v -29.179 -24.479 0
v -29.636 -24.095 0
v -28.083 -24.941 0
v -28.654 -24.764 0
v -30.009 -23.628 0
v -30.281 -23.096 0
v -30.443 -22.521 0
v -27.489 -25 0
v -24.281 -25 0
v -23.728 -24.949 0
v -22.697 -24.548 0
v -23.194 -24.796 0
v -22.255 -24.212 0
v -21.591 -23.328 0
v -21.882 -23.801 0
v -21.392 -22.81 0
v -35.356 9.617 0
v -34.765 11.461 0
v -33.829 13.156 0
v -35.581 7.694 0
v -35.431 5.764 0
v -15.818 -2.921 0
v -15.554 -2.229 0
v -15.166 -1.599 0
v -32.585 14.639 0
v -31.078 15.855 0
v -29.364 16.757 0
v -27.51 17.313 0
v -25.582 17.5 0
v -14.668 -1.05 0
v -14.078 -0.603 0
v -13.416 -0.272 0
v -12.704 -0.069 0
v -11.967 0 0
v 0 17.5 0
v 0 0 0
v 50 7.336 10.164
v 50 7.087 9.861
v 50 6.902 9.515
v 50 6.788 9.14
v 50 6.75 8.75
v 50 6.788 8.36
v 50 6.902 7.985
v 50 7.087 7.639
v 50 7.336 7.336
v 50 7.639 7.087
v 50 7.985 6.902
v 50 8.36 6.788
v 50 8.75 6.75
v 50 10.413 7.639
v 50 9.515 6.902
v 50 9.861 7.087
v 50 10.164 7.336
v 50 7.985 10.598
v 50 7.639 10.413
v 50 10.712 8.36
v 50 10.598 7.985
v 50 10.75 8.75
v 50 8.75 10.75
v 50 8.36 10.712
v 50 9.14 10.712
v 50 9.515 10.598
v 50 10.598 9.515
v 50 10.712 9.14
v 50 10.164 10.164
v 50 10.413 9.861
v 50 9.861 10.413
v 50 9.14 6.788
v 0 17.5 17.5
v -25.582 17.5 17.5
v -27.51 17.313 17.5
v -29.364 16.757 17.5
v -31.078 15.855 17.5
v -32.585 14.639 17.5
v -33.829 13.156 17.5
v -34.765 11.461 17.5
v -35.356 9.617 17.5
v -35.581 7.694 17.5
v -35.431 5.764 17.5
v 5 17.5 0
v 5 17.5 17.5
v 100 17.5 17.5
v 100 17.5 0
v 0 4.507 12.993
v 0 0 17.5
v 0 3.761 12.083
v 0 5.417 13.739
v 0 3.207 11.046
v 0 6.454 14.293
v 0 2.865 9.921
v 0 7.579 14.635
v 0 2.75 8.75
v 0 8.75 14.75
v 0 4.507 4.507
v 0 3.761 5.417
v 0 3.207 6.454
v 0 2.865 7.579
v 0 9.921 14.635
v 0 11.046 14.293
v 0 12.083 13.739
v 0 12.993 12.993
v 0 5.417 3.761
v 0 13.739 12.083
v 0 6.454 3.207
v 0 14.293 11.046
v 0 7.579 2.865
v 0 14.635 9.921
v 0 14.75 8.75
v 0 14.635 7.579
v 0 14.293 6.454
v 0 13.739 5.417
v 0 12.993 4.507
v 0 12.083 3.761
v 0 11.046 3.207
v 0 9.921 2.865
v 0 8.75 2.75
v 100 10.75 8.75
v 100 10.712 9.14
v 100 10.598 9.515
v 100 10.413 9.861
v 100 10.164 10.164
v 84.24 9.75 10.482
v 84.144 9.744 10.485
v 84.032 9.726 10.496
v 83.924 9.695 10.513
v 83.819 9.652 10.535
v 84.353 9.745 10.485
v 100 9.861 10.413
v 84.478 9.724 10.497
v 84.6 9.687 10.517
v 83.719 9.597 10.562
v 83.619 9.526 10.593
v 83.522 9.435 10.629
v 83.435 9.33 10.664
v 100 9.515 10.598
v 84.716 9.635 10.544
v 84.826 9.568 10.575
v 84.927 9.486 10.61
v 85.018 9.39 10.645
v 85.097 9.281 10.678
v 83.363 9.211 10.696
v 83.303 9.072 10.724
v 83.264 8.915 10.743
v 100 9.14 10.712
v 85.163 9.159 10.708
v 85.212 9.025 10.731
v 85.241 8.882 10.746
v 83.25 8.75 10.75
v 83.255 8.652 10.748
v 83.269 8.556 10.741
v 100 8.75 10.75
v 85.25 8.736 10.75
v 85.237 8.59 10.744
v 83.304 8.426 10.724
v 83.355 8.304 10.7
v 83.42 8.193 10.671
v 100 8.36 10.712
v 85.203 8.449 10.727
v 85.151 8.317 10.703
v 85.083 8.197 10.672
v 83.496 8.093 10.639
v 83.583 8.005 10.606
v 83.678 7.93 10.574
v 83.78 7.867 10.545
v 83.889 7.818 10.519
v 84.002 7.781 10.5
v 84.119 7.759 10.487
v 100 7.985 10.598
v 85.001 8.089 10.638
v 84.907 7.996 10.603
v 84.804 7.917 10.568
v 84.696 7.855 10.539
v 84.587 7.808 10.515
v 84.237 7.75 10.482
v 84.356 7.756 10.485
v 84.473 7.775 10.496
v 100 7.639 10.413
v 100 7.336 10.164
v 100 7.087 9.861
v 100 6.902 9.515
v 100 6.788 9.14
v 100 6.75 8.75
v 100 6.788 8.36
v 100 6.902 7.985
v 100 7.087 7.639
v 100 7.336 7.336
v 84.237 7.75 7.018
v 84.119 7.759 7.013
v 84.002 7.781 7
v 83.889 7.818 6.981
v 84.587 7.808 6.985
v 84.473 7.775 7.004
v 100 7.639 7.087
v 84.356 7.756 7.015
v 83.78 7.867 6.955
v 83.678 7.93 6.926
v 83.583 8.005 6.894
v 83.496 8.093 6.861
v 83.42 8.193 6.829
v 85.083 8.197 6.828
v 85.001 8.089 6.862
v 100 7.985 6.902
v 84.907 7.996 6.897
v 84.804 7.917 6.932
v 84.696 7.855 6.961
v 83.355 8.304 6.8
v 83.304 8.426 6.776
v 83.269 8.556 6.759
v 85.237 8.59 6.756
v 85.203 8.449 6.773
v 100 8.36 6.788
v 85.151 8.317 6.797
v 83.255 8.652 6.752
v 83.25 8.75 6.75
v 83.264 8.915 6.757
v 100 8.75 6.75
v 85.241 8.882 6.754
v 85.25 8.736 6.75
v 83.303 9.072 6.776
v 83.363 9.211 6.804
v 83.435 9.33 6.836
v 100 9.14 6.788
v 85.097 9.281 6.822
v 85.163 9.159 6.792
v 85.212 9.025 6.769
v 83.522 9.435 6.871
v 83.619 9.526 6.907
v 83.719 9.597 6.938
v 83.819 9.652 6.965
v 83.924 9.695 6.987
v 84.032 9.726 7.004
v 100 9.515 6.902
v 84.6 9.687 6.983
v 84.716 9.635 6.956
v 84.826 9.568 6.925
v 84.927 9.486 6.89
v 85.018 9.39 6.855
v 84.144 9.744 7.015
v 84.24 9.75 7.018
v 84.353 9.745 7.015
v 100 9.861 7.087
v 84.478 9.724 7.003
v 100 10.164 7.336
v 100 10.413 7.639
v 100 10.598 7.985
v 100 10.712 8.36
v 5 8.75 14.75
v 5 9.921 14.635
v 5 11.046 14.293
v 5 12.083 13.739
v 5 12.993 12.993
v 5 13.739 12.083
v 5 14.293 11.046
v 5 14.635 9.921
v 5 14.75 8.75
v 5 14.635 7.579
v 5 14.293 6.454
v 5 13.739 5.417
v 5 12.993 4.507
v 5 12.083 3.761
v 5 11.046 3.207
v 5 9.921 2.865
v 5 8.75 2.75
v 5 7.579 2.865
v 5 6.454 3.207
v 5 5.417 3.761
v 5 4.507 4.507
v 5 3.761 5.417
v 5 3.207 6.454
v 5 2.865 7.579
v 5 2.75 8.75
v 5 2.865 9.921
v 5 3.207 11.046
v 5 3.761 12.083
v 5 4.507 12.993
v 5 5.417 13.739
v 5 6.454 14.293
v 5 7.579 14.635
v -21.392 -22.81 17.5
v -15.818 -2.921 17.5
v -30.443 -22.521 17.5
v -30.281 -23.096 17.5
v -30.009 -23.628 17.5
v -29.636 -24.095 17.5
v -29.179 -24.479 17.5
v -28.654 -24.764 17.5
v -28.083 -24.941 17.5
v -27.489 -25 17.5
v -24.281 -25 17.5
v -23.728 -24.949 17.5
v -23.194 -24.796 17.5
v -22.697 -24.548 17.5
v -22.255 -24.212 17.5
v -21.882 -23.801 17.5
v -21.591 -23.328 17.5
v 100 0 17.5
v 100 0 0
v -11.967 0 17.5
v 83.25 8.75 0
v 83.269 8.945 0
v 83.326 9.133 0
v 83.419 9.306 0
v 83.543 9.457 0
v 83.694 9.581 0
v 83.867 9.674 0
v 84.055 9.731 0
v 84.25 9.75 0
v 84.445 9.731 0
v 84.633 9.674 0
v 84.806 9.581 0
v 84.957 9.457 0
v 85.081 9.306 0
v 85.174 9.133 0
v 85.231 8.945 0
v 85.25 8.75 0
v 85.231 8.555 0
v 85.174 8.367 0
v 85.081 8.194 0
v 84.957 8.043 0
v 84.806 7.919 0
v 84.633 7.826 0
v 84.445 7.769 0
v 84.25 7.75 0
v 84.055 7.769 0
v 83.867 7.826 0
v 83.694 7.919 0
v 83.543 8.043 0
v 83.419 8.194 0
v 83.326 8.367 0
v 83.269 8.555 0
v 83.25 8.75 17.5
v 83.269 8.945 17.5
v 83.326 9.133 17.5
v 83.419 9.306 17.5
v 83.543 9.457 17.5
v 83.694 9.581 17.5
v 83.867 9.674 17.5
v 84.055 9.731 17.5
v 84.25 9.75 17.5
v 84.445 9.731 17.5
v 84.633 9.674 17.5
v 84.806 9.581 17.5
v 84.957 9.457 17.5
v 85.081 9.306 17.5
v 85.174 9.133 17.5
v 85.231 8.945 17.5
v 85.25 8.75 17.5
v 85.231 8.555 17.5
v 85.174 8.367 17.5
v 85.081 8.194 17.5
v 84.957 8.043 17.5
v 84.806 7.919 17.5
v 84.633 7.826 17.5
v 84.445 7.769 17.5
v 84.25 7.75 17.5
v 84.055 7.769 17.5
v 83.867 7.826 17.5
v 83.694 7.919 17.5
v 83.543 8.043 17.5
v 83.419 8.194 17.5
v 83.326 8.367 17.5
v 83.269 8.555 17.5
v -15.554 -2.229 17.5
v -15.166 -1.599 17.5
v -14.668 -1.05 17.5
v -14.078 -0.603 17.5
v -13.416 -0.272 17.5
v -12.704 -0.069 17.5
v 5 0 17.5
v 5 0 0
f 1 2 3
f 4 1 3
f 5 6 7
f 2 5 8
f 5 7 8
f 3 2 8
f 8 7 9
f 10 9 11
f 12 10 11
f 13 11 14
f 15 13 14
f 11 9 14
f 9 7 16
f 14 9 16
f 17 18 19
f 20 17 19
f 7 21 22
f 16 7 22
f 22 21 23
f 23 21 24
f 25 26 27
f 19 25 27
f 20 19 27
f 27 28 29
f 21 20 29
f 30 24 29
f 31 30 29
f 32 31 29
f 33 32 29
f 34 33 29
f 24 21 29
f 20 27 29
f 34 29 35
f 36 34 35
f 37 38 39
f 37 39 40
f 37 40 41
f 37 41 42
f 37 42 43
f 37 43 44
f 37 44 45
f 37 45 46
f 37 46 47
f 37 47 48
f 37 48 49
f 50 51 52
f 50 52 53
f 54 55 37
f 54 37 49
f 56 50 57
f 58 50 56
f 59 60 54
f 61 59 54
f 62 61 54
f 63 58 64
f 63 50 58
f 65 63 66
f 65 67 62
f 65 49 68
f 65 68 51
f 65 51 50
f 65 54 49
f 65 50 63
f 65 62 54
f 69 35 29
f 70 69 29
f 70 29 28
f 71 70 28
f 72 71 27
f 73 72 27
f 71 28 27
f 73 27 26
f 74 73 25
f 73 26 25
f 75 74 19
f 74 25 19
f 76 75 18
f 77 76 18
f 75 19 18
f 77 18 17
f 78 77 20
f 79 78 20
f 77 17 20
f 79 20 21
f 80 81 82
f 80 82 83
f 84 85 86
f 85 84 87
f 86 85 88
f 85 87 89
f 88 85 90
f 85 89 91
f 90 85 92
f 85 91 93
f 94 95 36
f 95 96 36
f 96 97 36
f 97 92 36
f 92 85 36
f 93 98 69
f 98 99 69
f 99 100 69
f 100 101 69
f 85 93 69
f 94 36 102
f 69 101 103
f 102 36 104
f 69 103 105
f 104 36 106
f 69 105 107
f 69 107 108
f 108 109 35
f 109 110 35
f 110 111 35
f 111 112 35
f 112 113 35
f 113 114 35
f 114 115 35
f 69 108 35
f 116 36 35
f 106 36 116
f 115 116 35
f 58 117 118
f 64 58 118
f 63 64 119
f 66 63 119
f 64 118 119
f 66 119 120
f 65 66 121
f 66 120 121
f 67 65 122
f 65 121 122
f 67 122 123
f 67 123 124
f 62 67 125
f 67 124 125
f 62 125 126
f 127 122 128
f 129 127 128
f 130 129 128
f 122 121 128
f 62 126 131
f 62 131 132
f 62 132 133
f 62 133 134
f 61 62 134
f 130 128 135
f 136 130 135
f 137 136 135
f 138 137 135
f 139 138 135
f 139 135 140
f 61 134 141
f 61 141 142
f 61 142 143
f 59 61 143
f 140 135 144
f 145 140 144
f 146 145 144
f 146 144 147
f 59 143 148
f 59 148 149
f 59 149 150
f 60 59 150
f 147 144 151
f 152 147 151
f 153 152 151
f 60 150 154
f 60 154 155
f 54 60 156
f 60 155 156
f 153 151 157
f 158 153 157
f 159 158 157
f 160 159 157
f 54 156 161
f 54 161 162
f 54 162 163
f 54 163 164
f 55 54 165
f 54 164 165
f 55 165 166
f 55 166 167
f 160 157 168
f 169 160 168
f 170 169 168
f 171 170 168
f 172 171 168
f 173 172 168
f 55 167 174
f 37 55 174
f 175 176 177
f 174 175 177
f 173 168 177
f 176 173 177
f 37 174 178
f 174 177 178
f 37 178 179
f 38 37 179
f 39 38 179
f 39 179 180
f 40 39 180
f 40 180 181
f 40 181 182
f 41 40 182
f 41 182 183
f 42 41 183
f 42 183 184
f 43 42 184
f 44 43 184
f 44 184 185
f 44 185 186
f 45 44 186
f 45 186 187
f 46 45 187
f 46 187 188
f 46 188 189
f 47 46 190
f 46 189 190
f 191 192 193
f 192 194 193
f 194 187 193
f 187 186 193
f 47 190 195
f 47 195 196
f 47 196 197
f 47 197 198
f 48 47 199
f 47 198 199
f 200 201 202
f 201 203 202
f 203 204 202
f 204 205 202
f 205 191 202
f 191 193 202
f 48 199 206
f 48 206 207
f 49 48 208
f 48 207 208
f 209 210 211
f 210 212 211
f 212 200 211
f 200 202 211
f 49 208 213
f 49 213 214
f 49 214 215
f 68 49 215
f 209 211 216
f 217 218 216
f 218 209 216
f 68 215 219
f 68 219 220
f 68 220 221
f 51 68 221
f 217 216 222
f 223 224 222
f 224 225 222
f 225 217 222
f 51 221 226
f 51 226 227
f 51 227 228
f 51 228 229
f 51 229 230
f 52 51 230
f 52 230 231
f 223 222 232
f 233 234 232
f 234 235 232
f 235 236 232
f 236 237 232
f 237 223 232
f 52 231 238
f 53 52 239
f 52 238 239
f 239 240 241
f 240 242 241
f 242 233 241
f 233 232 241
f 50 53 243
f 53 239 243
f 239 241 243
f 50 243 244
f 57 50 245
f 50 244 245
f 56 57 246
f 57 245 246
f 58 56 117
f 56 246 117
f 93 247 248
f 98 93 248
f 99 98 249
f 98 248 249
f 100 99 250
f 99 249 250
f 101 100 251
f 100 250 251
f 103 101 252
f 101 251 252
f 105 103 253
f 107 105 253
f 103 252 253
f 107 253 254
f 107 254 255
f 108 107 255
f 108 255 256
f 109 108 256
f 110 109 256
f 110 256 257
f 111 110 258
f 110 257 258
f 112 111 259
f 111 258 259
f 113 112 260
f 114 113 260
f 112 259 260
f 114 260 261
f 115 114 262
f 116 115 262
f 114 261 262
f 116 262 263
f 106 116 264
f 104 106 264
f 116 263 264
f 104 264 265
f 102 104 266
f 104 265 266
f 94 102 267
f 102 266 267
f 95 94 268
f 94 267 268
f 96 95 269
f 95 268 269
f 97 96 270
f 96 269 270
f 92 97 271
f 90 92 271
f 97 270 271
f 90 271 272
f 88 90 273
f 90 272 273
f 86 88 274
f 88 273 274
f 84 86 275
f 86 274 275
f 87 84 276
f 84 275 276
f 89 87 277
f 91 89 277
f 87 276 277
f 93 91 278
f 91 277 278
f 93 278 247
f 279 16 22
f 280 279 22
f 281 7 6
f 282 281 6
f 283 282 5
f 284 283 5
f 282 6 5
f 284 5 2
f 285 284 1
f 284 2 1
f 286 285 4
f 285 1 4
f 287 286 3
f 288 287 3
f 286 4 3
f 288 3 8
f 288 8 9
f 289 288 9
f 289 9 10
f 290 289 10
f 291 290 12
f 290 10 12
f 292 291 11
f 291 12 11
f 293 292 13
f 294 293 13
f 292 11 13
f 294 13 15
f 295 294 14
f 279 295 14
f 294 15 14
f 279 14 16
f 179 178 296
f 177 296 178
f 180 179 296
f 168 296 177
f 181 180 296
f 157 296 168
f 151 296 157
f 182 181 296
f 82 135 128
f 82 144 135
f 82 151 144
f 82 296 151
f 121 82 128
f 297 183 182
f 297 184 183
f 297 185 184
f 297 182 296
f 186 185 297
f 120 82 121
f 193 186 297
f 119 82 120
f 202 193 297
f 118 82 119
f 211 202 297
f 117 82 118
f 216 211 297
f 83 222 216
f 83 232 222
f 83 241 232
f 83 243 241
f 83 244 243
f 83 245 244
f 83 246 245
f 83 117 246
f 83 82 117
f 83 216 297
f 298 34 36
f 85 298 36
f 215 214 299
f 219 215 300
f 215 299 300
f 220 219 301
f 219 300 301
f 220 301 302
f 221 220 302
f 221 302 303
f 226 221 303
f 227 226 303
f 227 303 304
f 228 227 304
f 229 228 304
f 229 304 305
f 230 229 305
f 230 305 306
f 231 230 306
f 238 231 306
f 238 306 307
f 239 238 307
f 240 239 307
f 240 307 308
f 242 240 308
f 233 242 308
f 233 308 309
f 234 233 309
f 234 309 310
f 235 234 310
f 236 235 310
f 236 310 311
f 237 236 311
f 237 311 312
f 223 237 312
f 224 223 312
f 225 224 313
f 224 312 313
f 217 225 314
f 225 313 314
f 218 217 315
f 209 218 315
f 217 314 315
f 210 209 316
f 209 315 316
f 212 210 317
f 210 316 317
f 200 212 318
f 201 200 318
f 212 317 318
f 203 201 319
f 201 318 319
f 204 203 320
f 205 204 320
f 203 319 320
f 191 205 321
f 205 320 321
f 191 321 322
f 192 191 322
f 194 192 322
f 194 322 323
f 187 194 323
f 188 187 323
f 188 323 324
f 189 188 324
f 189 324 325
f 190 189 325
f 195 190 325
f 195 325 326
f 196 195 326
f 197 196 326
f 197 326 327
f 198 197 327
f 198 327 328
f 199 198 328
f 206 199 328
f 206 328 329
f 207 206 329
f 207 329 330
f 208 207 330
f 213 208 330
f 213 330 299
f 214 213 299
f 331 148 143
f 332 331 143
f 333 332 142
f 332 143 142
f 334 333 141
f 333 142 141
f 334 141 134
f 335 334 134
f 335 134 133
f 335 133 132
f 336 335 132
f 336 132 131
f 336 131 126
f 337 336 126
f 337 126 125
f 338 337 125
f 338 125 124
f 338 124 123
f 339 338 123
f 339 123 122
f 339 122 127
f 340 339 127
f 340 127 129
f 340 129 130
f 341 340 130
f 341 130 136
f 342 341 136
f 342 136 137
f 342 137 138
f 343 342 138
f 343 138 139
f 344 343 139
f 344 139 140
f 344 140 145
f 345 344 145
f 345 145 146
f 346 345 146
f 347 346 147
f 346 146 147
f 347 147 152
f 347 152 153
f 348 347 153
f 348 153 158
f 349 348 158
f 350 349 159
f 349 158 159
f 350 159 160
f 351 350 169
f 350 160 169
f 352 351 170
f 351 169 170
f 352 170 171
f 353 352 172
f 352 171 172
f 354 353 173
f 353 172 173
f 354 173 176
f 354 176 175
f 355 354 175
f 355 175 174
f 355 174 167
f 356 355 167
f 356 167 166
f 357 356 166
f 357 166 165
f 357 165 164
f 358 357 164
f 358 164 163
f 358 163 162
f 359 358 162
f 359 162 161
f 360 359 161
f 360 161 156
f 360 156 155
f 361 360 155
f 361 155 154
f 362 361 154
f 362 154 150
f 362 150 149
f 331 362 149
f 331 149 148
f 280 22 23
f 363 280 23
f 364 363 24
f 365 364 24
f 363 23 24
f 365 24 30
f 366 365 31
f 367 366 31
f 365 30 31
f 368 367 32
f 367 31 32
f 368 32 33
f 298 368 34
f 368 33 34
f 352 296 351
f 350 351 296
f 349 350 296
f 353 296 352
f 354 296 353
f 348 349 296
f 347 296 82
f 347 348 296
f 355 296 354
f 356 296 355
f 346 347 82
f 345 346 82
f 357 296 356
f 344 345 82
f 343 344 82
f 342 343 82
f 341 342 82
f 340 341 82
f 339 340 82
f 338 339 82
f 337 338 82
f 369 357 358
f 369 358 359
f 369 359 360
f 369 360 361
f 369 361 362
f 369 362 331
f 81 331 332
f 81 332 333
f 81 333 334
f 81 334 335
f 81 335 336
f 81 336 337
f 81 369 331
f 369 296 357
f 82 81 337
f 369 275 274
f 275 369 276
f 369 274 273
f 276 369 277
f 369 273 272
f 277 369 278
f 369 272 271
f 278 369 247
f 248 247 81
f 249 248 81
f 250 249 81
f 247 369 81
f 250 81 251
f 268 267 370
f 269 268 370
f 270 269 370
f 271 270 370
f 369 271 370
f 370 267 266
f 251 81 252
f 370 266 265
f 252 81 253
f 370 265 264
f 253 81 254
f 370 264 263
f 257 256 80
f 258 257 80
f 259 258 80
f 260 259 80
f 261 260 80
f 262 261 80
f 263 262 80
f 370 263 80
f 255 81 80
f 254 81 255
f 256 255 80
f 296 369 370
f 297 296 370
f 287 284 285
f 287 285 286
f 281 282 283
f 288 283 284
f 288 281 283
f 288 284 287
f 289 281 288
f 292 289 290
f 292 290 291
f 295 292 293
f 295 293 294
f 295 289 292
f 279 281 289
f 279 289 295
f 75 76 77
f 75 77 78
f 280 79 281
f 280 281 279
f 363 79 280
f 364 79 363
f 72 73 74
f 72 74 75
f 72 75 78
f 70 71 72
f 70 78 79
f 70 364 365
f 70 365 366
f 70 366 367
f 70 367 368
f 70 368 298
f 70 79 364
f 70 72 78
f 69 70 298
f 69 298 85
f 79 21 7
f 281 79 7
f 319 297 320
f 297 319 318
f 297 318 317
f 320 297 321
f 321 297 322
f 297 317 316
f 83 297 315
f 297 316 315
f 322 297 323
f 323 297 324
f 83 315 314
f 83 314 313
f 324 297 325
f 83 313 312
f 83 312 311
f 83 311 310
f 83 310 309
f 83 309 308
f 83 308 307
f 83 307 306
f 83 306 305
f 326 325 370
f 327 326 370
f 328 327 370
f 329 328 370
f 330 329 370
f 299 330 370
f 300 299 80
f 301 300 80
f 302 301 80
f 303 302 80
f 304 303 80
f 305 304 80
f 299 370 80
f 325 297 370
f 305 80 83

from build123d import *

# Parameters (mm, degrees)
BOSS_EXTRUDE4_START = 5
SKETCH2_W           = 17.5
SKETCH2_H           = 17.5
BOSS_EXTRUDE4_DEPTH = 95
SKETCH3_R           = 2
CUT_EXTRUDE1_DEPTH  = 50
SKETCH4_R           = 1
CUT_EXTRUDE2_DEPTH  = 50
SKETCH6_R           = 6
BOSS_EXTRUDE6_DEPTH = 5
BOSS_EXTRUDE8_DEPTH = 17.5


with BuildPart() as part:
    # Sketch2 → Boss-Extrude4 (new body)
    with BuildSketch(Plane(origin=(0, 0, 0), x_dir=(0, 0, -1), z_dir=(1, 0, 0)).offset(BOSS_EXTRUDE4_START)):
        with Locations((-8.75, 8.75)):
            Rectangle(SKETCH2_W, SKETCH2_H)
    extrude(amount=BOSS_EXTRUDE4_DEPTH)

    # Sketch3 → Cut-Extrude1 (cut)
    with BuildSketch(Plane(origin=(100, 0, 0), x_dir=(0, 0, -1), z_dir=(1, 0, 0))):
        with Locations(Location((-8.75, 8.75, 0), (0, 0, 90))):
            Circle(SKETCH3_R)
    extrude(amount=-CUT_EXTRUDE1_DEPTH, mode=Mode.SUBTRACT)

    # Sketch4 → Cut-Extrude2 (cut)
    with BuildSketch(Plane(origin=(0, 0, 0), x_dir=(-1, 0, 0), z_dir=(0, 0, -1))):
        with Locations((-84.25, 8.75)):
            Circle(SKETCH4_R)
    extrude(amount=-CUT_EXTRUDE2_DEPTH, mode=Mode.SUBTRACT)

    # Sketch6 → Boss-Extrude6 (add)
    with BuildSketch(Plane.ZY.offset(-5)):
        with Locations((8.75, 8.75)):
            Circle(SKETCH6_R)
    extrude(amount=BOSS_EXTRUDE6_DEPTH)

    # Sketch1 → Boss-Extrude8 (add)
    with BuildSketch(Plane.XY):
        with BuildLine():
            Line((0, 17.5), (-25.582464074, 17.5))
            ThreePointArc((-25.582464074, 17.5), (-33.242908505, 13.927876097), (-35.430541604, 5.763518223))
            Line((-35.430541604, 5.763518223), (-30.443227685, -22.520944533))
            ThreePointArc((-30.443227685, -22.520944533), (-29.417167255, -24.298133329), (-27.488804426, -25))
            Line((-27.488804426, -25), (-24.280949674, -25))
            ThreePointArc((-24.280949674, -25), (-22.468303976, -24.390463464), (-21.392240798, -22.809543714))
            Line((-21.392240798, -22.809543714), (-15.818483363, -2.920608381))
            ThreePointArc((-15.818483363, -2.920608381), (-14.383732459, -0.812715382), (-11.966871527, 0))
            Line((-11.966871527, 0), (0, 0))
            Line((0, 0), (0, 17.5))
        make_face()
    extrude(amount=BOSS_EXTRUDE8_DEPTH)


solid = part.part
